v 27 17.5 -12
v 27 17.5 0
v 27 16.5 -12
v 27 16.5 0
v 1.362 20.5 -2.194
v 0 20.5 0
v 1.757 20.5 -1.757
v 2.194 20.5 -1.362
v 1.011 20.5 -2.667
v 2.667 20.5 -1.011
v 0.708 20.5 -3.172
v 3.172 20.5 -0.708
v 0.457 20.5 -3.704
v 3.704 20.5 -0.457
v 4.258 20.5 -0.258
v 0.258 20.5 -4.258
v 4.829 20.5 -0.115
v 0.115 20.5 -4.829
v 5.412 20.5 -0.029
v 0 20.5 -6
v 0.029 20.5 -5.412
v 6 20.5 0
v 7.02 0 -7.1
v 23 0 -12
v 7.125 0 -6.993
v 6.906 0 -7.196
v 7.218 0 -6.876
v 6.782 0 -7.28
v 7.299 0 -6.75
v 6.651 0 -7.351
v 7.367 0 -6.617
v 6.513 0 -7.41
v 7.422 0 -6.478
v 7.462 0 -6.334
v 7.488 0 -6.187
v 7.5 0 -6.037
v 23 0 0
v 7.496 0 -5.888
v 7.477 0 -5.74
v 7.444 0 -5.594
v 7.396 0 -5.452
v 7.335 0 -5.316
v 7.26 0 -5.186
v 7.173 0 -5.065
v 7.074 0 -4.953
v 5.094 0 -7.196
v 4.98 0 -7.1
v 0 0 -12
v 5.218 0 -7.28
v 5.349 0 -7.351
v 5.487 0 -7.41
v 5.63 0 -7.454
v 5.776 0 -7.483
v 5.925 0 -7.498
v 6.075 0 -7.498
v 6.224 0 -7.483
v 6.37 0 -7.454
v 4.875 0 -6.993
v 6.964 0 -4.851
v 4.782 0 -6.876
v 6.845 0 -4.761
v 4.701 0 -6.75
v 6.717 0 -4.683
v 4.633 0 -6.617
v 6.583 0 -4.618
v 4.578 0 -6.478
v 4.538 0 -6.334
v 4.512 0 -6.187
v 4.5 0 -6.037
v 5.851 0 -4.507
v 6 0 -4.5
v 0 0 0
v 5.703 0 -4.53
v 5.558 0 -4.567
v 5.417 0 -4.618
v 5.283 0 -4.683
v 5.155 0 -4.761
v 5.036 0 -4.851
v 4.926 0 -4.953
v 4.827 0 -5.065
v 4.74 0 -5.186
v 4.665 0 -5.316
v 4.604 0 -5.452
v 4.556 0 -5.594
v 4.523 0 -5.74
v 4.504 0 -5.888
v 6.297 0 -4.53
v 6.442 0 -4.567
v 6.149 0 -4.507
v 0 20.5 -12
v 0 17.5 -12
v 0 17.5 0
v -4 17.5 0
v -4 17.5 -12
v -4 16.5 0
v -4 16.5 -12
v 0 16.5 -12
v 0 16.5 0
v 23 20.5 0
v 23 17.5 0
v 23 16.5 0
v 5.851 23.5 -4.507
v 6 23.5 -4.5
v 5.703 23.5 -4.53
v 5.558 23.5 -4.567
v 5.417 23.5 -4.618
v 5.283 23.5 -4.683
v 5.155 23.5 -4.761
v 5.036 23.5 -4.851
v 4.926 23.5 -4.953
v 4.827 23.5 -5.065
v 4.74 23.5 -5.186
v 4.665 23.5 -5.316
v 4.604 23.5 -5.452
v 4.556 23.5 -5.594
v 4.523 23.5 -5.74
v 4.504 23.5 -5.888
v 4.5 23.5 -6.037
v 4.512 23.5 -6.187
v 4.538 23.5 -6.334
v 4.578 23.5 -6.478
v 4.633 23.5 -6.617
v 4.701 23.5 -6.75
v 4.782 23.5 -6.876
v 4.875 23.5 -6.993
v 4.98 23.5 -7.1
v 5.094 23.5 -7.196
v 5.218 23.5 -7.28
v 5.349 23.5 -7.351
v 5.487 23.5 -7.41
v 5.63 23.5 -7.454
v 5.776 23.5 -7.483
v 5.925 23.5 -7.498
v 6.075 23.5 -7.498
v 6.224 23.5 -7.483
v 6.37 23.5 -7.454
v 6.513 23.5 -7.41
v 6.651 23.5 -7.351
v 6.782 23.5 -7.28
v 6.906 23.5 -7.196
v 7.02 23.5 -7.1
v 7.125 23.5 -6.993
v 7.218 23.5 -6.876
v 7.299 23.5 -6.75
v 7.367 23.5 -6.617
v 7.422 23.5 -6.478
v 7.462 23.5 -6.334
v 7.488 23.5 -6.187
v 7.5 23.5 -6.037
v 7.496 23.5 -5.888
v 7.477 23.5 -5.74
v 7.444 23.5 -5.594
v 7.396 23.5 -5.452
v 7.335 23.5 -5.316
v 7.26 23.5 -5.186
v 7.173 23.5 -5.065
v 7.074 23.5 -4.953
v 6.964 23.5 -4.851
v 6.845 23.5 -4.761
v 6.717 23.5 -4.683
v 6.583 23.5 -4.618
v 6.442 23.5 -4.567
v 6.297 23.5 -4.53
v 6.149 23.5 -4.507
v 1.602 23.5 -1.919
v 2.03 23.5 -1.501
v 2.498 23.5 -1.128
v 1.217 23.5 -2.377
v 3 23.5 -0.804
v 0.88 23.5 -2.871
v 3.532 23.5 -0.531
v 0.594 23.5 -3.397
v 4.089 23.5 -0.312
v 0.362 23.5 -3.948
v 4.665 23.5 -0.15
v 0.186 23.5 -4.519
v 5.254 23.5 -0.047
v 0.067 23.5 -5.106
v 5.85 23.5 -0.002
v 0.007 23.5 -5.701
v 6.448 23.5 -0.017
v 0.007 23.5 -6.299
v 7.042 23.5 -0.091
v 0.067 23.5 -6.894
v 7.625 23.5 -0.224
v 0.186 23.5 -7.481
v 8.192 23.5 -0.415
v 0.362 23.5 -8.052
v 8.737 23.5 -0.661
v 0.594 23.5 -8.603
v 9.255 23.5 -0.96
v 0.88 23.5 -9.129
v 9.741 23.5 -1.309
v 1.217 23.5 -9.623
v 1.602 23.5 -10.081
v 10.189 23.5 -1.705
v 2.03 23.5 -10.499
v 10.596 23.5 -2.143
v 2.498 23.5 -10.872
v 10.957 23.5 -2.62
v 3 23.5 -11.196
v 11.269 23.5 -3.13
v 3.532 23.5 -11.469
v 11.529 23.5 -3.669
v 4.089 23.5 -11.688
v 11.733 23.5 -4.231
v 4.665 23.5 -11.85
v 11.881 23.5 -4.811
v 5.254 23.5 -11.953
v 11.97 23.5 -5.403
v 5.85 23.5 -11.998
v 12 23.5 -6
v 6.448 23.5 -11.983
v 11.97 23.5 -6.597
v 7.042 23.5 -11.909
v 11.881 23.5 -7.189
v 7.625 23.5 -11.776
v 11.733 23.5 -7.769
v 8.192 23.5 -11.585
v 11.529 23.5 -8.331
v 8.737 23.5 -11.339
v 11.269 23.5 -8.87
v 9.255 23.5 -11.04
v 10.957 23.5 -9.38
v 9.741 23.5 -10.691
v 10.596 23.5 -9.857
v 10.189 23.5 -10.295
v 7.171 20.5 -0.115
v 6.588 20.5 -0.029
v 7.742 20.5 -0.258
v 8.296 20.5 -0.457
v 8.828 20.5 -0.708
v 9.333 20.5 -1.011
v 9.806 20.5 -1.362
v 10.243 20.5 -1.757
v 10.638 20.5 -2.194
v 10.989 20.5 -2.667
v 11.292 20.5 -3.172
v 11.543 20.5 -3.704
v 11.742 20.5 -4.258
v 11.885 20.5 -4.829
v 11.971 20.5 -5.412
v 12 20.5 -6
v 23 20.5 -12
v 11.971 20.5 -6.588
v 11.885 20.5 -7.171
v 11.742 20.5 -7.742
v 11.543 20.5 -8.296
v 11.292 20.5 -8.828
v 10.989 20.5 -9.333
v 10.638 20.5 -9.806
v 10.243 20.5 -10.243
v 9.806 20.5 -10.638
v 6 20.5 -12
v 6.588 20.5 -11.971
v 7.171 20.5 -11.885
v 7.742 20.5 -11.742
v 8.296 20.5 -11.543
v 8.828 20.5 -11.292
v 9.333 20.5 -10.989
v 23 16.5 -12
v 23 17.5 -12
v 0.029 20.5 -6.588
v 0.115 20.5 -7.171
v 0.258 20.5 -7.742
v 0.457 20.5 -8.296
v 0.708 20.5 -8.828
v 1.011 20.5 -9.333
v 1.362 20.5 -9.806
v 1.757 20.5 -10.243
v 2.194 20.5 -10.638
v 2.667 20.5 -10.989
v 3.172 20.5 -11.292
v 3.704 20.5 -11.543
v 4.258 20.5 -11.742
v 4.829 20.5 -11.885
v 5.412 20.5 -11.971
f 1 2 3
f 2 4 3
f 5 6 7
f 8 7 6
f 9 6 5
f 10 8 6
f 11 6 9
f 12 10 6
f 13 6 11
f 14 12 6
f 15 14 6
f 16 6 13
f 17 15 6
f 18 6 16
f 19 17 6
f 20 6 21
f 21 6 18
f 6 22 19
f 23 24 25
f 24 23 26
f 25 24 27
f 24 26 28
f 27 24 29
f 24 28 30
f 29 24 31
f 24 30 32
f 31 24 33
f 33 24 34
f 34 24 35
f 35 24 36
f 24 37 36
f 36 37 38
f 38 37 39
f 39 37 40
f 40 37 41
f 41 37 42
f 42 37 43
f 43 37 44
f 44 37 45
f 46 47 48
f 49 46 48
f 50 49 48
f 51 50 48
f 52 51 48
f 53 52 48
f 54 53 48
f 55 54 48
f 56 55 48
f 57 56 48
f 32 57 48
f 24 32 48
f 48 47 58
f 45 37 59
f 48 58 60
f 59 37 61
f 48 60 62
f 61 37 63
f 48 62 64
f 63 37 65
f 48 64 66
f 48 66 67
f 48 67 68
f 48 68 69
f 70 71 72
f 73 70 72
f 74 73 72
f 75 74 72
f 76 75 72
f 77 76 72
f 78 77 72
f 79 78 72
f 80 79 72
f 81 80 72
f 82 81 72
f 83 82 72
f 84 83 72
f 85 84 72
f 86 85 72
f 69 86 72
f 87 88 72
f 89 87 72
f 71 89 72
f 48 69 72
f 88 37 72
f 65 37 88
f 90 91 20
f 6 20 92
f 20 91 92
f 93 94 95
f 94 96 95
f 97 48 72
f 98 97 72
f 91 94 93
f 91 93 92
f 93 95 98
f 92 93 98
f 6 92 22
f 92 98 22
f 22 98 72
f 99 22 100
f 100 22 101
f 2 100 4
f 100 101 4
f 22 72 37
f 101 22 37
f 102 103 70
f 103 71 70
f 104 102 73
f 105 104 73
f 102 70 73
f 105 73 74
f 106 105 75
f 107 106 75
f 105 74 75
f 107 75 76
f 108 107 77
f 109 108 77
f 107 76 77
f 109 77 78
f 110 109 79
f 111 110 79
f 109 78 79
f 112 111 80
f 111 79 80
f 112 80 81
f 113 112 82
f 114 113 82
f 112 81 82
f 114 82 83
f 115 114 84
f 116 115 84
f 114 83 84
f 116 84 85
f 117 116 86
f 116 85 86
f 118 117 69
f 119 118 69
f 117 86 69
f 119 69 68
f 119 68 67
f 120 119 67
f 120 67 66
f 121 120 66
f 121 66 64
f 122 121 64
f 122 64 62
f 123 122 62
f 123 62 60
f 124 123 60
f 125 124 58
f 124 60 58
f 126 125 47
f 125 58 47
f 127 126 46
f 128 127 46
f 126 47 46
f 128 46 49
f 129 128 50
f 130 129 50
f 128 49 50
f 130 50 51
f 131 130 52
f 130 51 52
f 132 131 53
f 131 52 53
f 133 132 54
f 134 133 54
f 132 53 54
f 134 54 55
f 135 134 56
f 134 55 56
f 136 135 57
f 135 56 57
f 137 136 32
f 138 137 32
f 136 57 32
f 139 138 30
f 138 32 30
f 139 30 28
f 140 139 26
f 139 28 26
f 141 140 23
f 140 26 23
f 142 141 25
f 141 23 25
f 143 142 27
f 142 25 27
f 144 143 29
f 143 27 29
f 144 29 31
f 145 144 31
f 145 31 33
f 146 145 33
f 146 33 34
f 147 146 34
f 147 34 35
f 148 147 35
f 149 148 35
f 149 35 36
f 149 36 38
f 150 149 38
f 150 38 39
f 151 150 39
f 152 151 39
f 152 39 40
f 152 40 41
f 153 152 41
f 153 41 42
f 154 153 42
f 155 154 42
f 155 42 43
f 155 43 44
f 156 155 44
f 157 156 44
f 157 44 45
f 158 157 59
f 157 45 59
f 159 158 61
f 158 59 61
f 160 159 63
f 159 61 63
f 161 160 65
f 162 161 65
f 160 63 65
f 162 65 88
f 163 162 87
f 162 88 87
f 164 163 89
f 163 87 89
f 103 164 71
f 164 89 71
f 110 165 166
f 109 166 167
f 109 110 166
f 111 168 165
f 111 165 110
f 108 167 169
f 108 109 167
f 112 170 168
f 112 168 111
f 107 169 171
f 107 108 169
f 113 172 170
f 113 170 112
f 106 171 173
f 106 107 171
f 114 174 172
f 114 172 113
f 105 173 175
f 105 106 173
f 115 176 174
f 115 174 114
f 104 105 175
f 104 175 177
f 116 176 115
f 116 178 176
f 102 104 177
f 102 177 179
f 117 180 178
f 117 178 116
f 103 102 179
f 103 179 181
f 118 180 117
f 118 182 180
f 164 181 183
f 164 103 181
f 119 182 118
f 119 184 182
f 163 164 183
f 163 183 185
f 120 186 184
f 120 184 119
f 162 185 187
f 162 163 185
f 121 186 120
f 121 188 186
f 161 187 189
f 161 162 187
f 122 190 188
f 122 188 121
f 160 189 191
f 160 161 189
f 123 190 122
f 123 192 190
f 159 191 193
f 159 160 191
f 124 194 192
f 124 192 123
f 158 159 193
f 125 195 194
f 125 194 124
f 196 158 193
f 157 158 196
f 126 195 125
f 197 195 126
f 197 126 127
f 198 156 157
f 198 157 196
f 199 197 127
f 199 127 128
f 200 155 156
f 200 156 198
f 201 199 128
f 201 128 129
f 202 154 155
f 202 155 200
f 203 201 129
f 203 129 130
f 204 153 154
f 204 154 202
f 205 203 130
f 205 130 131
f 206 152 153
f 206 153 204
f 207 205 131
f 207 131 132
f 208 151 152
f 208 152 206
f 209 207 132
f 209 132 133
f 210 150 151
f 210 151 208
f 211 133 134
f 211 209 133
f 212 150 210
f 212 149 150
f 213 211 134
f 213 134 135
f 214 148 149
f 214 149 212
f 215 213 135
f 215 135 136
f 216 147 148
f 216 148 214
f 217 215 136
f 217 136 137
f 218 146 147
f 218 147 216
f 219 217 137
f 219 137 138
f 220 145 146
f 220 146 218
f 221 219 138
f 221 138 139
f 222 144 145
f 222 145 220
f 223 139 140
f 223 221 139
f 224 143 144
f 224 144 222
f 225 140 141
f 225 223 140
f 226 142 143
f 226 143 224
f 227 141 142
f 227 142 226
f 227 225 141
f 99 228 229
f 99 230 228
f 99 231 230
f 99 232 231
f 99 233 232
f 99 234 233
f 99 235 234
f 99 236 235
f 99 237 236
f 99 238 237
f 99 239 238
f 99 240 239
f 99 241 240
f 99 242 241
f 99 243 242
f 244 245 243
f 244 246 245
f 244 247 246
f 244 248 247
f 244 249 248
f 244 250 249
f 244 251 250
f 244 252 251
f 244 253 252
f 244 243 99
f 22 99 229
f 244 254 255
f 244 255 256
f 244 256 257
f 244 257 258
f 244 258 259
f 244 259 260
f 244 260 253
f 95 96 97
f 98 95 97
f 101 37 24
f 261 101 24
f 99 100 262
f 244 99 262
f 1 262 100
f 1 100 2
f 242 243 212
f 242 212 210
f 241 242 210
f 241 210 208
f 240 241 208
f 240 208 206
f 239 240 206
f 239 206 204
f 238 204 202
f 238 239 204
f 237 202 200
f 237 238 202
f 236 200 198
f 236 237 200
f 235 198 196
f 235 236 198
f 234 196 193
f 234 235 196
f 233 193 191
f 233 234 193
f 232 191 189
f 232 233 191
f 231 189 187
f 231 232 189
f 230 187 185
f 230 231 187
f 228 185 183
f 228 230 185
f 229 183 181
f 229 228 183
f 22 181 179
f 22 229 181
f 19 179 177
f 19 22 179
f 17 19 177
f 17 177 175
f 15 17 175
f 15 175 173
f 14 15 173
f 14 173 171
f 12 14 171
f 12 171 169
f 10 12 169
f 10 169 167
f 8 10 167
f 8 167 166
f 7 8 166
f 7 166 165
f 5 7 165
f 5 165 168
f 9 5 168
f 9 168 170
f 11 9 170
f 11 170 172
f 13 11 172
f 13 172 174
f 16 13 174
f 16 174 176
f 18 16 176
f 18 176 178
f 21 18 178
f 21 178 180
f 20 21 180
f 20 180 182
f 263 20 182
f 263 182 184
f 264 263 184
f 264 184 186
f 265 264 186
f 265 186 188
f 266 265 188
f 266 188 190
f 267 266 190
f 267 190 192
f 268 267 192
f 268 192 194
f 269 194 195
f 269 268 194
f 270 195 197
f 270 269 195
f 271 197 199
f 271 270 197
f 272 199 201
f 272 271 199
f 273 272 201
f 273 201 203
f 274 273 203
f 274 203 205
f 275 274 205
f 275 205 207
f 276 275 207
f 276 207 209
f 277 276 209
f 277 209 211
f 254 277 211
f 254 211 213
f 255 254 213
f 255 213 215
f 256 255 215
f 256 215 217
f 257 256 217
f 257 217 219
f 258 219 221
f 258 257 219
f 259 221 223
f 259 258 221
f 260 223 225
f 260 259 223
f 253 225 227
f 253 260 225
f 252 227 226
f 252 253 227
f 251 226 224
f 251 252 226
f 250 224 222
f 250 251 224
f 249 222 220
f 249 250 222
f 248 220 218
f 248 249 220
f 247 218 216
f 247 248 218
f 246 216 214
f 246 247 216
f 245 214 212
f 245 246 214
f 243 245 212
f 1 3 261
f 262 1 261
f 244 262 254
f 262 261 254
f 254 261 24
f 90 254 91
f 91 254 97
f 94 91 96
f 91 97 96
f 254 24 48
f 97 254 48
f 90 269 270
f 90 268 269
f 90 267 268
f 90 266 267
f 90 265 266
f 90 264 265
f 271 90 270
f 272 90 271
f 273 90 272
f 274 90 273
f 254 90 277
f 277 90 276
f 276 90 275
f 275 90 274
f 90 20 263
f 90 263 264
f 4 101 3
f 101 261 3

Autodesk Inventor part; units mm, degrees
ref_plane "YZ Plane" through (0, 0, 0) normal (1, 0, 0) x (0, 1, 0)
ref_plane "XZ Plane" through (0, 0, 0) normal (0, 1, 0) x (-1, 0, 0)
ref_plane "XY Plane" through (0, 0, 0) normal (0, 0, 1) x (1, 0, 0)
sketch "スケッチ1" plane through (0, 0, 0) normal (0, 1, 0) x (-1, 0, 0)
  line L0 (0, 0) -> (-23, 0)
  line L1 (-23, 0) -> (-23, -12)
  line L2 (-23, -12) -> (0, -12)
  line L3 (0, -12) -> (0, 0)
  dimension "d0" = 23
  dimension "d1" = 12
extrude "押し出し1" add sketch "スケッチ1" along normal blind 16.5
sketch "スケッチ2" plane through (0, 16.5, 0) normal (0, 1, 0) x (1, 0, 0)
  line L0 (23, 0) -> (23, 12) projected
  line L1 (23, 12) -> (0, 12) projected
  line L2 (0, 12) -> (0, 0) projected
  line L3 (0, 0) -> (23, 0) projected
  line L4 (-4, 0) -> (27, 0)
  line L5 (27, 0) -> (27, 12)
  line L6 (27, 12) -> (-4, 12)
  line L7 (-4, 12) -> (-4, 0)
  dimension "d4" = 4
  dimension "d5" = 4
extrude "押し出し2" add sketch "スケッチ2" along normal blind 1
sketch "スケッチ3" plane through (0, 17.5, 0) normal (0, 1, 0) x (1, 0, 0)
  line L0 (-4, 0) -> (27, 0) projected
  line L1 (27, 12) -> (-4, 12) projected
  line L2 (0, 12) -> (0, 0) projected
  line L3 (23, 0) -> (23, 12) projected
extrude "押し出し3" add sketch "スケッチ3" along normal blind 3
sketch "スケッチ4" plane through (0, 20.5, 0) normal (0, 1, 0) x (1, 0, 0)
  line L0 (23, 12) -> (0, 12) projected
  line L1 (0, 12) -> (0, 0) projected
  line L2 (0, 0) -> (23, 0) projected
  circle A0 centre (6, 6) radius 6
extrude "押し出し4" add sketch "スケッチ4" along normal blind 3 contours A0
sketch "スケッチ5" plane through (6, 23.5, -6) normal (0, 1, 0) x (1, 0, 0)
  circle A0 centre (0, 0) radius 6 projected
  point P0 (-6, -6)
hole "穴1" at (6, 23.5, -6) direction (0, -1, 0) diameter 3 end through all
equation "\"d5\" = d4"
properties part number "ServoMotor_8g"
